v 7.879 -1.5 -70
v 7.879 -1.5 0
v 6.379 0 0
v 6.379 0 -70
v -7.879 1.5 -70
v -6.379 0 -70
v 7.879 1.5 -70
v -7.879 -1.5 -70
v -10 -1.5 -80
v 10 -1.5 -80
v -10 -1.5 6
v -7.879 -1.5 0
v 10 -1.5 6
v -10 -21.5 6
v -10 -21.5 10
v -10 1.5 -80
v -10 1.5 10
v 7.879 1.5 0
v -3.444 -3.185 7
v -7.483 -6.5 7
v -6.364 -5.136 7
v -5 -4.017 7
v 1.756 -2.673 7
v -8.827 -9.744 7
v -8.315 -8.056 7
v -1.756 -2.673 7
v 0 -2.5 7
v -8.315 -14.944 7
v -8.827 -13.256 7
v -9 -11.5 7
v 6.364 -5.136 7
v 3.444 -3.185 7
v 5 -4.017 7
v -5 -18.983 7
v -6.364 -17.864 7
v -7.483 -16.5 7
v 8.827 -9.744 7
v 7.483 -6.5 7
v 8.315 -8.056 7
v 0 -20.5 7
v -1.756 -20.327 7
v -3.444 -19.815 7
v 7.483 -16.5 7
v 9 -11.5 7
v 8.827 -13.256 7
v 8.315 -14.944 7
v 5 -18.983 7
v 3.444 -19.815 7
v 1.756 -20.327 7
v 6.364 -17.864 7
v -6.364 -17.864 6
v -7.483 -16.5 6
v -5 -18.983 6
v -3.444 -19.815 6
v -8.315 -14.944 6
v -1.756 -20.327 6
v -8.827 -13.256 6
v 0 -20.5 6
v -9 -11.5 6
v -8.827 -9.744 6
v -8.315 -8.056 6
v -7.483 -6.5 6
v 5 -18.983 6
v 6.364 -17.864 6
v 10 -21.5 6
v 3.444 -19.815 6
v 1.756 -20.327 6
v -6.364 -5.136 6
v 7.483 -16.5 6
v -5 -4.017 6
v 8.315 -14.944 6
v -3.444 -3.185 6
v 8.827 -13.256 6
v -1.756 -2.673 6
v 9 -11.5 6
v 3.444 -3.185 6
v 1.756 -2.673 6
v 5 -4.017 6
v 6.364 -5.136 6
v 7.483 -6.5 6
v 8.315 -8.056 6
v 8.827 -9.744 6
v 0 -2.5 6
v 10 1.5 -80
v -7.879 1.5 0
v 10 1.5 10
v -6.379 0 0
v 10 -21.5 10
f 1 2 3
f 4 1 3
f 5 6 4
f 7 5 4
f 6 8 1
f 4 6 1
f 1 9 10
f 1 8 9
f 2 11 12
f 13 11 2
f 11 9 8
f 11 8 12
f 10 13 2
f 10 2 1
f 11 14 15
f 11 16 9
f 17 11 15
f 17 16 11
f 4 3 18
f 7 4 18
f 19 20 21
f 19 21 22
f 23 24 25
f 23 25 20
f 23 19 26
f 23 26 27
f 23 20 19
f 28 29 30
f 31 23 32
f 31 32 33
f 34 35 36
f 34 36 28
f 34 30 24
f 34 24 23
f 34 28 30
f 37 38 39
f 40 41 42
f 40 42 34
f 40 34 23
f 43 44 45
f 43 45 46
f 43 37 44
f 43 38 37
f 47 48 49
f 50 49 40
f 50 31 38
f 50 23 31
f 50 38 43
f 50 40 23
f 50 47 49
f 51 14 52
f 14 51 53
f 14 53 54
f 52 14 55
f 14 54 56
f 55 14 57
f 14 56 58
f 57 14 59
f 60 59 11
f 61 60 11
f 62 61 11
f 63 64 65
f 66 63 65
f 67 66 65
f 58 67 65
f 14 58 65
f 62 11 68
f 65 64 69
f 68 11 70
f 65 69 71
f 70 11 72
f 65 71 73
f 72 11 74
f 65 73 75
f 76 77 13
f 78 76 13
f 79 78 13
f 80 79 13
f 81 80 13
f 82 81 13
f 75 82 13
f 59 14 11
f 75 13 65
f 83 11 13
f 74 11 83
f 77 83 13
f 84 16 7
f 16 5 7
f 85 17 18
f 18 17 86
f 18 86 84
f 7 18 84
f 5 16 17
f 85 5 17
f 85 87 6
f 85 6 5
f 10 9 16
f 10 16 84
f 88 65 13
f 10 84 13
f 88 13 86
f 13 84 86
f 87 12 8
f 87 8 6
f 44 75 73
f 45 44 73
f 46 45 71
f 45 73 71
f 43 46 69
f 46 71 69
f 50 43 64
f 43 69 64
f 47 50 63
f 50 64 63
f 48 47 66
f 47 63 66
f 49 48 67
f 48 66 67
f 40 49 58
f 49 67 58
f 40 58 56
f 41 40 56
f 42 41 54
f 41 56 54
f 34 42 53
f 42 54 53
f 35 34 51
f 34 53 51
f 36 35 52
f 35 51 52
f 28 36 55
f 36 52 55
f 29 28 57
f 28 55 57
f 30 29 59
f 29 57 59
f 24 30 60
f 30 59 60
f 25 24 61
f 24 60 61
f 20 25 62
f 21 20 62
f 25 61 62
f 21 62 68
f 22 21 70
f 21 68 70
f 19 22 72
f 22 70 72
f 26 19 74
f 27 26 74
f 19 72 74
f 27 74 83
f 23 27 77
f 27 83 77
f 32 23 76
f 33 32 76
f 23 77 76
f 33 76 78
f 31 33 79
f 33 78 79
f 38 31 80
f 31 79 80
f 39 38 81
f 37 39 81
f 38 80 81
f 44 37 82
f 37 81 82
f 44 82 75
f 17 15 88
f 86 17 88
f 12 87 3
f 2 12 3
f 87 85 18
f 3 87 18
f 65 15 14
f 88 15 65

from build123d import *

# Parameters (mm, degrees)
SKETCH010_W  = 20
SKETCH010_H  = 3
PAD008_DEPTH = 10
PAD009_DEPTH = 70
SKETCH012_W  = 20
SKETCH012_H  = 3
PAD010_DEPTH = 10
SKETCH014_W  = 20
SKETCH014_H  = 4
PAD012_DEPTH = 20
SKETCH018_R  = 9
POCKET_DEPTH = 1


with BuildPart() as part:
    # Sketch010 (on XY_Plane of Origin012) → Pad008 (new body)
    with BuildSketch(Plane.XY):
        Rectangle(SKETCH010_W, SKETCH010_H)
    extrude(amount=PAD008_DEPTH)

    # Sketch011 (on Face5 of Pad008) → Pad009 (join)
    with BuildSketch(Plane(origin=(0, 0, 0), x_dir=(1, 0, 0), z_dir=(0, 0, -1))):
        Polygon((-7.87868, 1.5), (-6.37868, 0), (-7.87868, -1.5), (-10, -1.5), (-10, 1.5), align=None)
        Polygon((7.87868, 1.5), (6.37868, 0), (7.87868, -1.5), (10, -1.5), (10, 1.5), align=None)
    extrude(amount=PAD009_DEPTH)

    # Sketch012 (on Face7 of Pad009) → Pad010 (join)
    with BuildSketch(Plane(origin=(0, 0, -70), x_dir=(1, 0, 0), z_dir=(0, 0, -1))):
        Rectangle(SKETCH012_W, SKETCH012_H)
    extrude(amount=PAD010_DEPTH)

    # Sketch014 (on Face10 of Pad010) → Pad012 (join)
    with BuildSketch(Plane.XZ.offset(1.5)):
        with Locations((0, 8)):
            Rectangle(SKETCH014_W, SKETCH014_H)
    extrude(amount=PAD012_DEPTH)

    # Sketch018 (on Face4 of Pad012) → Pocket (cut)
    with BuildSketch(Plane(origin=(0, 0, 6), x_dir=(1, 0, 0), z_dir=(0, 0, -1))):
        with Locations((0, 11.5)):
            Circle(SKETCH018_R)
    extrude(amount=-POCKET_DEPTH, mode=Mode.SUBTRACT)


solid = part.part
